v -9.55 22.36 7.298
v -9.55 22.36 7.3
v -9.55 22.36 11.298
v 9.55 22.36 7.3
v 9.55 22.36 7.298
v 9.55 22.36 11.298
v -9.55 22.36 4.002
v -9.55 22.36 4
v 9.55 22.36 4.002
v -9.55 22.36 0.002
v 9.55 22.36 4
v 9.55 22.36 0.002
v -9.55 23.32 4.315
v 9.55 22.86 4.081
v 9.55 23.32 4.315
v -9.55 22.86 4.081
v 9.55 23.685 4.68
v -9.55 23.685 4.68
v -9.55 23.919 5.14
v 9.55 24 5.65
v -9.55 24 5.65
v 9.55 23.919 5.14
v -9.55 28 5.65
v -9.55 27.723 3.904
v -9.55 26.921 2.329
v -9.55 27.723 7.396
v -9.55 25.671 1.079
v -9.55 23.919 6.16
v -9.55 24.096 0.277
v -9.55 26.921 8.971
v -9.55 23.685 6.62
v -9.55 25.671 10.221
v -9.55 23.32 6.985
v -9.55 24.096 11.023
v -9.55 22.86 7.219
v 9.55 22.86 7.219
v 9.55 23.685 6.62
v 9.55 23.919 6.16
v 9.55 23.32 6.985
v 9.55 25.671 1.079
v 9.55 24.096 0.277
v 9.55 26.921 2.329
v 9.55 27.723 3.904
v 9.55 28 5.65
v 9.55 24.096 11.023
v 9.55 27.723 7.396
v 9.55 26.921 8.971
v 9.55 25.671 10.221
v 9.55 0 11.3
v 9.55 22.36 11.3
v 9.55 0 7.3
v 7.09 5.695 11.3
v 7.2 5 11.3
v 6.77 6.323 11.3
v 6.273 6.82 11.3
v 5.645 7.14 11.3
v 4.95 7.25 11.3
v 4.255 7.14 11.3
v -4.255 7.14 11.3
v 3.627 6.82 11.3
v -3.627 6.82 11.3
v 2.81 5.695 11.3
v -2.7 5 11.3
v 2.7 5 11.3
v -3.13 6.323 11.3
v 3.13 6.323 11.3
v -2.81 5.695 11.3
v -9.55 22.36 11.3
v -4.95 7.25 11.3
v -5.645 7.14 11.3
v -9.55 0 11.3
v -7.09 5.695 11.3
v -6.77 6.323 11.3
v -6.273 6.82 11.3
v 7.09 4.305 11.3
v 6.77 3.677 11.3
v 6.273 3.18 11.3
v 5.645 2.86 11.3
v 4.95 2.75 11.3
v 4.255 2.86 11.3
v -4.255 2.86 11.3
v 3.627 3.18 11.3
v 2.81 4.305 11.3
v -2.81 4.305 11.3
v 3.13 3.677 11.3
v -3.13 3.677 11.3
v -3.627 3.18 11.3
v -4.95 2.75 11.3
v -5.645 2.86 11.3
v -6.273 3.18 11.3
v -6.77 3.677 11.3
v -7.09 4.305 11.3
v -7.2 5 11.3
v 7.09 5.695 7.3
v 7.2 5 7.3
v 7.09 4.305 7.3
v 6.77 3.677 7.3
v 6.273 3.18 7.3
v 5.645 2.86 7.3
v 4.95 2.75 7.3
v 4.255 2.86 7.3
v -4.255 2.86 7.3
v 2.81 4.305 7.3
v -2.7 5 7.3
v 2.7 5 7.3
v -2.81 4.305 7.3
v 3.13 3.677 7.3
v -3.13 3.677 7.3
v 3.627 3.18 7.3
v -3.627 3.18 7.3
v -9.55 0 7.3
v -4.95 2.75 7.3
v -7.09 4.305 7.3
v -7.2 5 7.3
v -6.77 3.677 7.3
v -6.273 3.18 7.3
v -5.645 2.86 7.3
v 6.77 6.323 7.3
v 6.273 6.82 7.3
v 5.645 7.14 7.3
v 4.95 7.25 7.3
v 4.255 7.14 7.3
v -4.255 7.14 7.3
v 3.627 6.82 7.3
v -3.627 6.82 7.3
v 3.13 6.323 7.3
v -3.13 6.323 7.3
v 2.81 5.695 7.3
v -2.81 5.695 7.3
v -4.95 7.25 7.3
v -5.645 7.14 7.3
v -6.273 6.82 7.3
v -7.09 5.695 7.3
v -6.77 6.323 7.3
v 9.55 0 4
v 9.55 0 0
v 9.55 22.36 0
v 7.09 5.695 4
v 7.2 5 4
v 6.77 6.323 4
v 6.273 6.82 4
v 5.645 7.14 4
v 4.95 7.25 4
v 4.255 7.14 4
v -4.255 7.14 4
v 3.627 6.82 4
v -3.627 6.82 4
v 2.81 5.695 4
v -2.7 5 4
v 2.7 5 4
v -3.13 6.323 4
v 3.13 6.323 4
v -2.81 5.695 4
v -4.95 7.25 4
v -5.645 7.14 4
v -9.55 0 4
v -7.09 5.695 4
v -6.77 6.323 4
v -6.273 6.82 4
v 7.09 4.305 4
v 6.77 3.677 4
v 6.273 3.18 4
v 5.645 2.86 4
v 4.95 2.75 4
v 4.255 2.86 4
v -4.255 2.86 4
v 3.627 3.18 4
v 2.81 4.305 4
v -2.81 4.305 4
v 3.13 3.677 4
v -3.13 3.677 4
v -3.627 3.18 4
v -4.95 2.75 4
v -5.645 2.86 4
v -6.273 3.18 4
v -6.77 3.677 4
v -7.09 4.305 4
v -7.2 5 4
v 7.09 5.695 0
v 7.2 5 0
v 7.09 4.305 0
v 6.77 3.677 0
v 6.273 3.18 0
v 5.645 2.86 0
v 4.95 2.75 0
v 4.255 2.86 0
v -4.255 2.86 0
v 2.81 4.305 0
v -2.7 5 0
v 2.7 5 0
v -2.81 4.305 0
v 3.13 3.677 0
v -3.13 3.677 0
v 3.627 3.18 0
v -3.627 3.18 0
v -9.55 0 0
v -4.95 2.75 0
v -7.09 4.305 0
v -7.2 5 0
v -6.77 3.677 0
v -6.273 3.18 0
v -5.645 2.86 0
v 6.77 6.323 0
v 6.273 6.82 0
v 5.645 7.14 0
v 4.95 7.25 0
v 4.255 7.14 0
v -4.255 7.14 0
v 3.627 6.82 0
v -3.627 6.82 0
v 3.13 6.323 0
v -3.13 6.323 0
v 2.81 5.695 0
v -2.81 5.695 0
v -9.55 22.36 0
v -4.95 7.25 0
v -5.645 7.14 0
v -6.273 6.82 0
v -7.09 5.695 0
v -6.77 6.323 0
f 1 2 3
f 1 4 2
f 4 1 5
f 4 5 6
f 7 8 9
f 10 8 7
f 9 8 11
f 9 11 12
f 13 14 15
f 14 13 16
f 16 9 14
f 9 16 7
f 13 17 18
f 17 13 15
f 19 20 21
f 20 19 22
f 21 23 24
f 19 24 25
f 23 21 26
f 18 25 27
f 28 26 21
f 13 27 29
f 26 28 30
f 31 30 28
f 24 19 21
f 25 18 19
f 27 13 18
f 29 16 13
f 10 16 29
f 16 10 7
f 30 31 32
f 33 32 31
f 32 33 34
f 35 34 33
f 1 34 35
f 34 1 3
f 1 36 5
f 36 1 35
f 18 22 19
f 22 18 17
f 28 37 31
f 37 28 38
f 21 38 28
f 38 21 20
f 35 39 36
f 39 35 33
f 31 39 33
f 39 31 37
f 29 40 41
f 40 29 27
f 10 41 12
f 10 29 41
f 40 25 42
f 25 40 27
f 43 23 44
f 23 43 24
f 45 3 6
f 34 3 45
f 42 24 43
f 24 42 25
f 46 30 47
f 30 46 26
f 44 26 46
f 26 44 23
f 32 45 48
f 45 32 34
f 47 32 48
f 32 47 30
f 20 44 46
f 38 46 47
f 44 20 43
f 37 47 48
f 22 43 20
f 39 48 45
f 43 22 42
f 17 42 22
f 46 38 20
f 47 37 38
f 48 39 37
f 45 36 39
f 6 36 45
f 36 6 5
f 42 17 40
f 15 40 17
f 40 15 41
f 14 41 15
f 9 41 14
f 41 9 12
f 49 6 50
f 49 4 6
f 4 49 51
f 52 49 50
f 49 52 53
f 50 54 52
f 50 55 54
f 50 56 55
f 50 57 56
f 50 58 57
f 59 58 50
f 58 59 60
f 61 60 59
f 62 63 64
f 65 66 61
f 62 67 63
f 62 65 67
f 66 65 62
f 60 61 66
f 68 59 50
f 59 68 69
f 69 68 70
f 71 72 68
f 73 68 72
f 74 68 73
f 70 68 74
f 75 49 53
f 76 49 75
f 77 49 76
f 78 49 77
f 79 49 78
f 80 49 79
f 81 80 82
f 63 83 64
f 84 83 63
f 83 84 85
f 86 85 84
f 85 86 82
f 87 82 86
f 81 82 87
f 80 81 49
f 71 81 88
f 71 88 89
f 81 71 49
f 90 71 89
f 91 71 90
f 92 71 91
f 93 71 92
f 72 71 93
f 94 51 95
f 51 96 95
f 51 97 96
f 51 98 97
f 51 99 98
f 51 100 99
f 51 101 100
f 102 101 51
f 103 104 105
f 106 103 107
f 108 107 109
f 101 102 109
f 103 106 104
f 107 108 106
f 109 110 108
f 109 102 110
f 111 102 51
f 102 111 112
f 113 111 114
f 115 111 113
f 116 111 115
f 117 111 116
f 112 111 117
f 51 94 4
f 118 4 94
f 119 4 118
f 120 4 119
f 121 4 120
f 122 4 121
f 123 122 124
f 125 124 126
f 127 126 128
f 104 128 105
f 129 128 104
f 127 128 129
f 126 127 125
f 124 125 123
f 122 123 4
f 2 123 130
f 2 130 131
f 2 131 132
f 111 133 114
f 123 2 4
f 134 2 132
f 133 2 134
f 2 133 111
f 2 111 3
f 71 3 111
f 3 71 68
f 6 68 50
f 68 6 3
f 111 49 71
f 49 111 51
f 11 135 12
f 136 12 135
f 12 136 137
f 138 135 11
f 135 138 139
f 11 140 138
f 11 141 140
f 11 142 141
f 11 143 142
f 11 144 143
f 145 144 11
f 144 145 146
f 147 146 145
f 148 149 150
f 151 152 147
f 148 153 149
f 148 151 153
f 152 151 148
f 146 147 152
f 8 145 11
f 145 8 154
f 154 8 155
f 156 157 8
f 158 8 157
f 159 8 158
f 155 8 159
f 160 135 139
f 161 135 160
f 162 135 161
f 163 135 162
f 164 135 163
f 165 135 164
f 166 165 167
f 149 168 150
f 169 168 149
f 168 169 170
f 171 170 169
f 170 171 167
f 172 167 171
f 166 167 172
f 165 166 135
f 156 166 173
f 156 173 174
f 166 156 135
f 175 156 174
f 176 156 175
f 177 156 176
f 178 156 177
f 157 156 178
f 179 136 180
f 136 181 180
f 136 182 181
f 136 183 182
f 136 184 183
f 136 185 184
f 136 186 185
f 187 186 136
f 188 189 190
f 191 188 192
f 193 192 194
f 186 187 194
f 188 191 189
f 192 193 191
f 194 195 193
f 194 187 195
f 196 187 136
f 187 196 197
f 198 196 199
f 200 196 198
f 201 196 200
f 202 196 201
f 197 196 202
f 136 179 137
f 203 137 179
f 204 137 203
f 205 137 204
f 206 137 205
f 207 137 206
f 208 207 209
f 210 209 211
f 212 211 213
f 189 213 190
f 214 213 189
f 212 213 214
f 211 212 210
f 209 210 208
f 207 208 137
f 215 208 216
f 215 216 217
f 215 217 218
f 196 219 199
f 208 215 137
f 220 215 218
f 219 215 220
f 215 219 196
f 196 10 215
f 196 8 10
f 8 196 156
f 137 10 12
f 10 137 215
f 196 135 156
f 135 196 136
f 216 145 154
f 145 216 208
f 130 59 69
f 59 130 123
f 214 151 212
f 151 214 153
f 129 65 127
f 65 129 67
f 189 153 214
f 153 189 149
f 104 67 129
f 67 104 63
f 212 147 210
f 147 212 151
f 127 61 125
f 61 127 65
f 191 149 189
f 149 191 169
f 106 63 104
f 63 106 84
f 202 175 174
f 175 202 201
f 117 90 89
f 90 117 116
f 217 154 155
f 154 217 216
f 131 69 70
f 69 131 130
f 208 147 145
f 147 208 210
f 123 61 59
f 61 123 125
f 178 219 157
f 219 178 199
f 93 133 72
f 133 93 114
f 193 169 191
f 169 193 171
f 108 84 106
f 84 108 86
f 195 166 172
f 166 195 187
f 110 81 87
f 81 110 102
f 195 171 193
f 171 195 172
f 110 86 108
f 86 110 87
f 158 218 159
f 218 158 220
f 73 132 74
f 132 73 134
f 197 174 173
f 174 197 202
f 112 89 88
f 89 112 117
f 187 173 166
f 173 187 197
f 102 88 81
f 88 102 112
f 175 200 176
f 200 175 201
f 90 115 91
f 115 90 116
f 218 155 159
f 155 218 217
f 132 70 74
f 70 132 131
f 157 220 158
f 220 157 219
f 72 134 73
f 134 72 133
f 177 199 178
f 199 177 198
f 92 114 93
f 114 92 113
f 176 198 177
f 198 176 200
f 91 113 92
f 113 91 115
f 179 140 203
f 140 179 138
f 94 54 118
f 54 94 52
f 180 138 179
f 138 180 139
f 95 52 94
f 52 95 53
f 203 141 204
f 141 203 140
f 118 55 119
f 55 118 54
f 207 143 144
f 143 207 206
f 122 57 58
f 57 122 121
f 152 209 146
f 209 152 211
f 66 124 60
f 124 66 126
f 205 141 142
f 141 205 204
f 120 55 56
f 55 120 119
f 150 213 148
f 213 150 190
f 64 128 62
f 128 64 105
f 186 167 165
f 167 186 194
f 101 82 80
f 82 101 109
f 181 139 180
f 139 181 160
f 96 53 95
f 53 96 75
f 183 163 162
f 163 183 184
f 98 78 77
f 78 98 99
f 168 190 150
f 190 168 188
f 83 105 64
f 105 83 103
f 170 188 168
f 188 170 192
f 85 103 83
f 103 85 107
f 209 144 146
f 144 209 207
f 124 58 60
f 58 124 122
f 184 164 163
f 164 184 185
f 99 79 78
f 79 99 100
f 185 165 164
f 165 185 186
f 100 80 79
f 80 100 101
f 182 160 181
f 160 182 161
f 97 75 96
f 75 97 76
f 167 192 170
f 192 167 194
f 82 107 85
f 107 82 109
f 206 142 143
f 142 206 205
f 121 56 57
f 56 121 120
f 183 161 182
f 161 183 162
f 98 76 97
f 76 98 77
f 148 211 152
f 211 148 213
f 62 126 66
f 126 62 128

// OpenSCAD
EPS = 0.01;
WALL_THICKNESS = 4.0;
GAP_THICKNESS = 3.3;
BACK_TO_TIP = 28.0;
HOLES_TO_TIP = 23.0;
HOLES_SPACING = 9.9;
HOLES_D = 4.5;
WIDTH=19.1;

outer_radius = WALL_THICKNESS + 0.5*GAP_THICKNESS;

difference() {
    union() {
        // Upper surface
        translate([-.5*WIDTH, 0, WALL_THICKNESS + GAP_THICKNESS])
        cube([WIDTH, BACK_TO_TIP - outer_radius + EPS, WALL_THICKNESS]);
        
        // Lower surface
        translate([-.5*WIDTH, 0, 0])
        cube([WIDTH, BACK_TO_TIP - outer_radius + EPS, WALL_THICKNESS]);
        
        // End
        translate([-.5*WIDTH, BACK_TO_TIP - outer_radius, outer_radius])
        rotate([0, 90, 0])
        difference() {
            cylinder(r=.5*GAP_THICKNESS + WALL_THICKNESS, h=WIDTH, $fn=20);
            union() {
                translate([-.5*GAP_THICKNESS - WALL_THICKNESS, -.5*GAP_THICKNESS - WALL_THICKNESS, -EPS])
                cube([GAP_THICKNESS + 2.*WALL_THICKNESS, .5*GAP_THICKNESS + WALL_THICKNESS + EPS, WIDTH + 2*EPS]);
                cylinder(r=.5*GAP_THICKNESS, h=WIDTH+2*EPS, $fn=20);
            }
        }
    }
    // Holes
    union() {
        translate([-.5*HOLES_SPACING, BACK_TO_TIP - HOLES_TO_TIP, -EPS])
        cylinder(r=.5*HOLES_D, h=2*outer_radius + 2*EPS, $fn=20);
        translate([+.5*HOLES_SPACING, BACK_TO_TIP - HOLES_TO_TIP, -EPS])
        cylinder(r=.5*HOLES_D, h=2*outer_radius + 2*EPS, $fn=20);
    }
}
